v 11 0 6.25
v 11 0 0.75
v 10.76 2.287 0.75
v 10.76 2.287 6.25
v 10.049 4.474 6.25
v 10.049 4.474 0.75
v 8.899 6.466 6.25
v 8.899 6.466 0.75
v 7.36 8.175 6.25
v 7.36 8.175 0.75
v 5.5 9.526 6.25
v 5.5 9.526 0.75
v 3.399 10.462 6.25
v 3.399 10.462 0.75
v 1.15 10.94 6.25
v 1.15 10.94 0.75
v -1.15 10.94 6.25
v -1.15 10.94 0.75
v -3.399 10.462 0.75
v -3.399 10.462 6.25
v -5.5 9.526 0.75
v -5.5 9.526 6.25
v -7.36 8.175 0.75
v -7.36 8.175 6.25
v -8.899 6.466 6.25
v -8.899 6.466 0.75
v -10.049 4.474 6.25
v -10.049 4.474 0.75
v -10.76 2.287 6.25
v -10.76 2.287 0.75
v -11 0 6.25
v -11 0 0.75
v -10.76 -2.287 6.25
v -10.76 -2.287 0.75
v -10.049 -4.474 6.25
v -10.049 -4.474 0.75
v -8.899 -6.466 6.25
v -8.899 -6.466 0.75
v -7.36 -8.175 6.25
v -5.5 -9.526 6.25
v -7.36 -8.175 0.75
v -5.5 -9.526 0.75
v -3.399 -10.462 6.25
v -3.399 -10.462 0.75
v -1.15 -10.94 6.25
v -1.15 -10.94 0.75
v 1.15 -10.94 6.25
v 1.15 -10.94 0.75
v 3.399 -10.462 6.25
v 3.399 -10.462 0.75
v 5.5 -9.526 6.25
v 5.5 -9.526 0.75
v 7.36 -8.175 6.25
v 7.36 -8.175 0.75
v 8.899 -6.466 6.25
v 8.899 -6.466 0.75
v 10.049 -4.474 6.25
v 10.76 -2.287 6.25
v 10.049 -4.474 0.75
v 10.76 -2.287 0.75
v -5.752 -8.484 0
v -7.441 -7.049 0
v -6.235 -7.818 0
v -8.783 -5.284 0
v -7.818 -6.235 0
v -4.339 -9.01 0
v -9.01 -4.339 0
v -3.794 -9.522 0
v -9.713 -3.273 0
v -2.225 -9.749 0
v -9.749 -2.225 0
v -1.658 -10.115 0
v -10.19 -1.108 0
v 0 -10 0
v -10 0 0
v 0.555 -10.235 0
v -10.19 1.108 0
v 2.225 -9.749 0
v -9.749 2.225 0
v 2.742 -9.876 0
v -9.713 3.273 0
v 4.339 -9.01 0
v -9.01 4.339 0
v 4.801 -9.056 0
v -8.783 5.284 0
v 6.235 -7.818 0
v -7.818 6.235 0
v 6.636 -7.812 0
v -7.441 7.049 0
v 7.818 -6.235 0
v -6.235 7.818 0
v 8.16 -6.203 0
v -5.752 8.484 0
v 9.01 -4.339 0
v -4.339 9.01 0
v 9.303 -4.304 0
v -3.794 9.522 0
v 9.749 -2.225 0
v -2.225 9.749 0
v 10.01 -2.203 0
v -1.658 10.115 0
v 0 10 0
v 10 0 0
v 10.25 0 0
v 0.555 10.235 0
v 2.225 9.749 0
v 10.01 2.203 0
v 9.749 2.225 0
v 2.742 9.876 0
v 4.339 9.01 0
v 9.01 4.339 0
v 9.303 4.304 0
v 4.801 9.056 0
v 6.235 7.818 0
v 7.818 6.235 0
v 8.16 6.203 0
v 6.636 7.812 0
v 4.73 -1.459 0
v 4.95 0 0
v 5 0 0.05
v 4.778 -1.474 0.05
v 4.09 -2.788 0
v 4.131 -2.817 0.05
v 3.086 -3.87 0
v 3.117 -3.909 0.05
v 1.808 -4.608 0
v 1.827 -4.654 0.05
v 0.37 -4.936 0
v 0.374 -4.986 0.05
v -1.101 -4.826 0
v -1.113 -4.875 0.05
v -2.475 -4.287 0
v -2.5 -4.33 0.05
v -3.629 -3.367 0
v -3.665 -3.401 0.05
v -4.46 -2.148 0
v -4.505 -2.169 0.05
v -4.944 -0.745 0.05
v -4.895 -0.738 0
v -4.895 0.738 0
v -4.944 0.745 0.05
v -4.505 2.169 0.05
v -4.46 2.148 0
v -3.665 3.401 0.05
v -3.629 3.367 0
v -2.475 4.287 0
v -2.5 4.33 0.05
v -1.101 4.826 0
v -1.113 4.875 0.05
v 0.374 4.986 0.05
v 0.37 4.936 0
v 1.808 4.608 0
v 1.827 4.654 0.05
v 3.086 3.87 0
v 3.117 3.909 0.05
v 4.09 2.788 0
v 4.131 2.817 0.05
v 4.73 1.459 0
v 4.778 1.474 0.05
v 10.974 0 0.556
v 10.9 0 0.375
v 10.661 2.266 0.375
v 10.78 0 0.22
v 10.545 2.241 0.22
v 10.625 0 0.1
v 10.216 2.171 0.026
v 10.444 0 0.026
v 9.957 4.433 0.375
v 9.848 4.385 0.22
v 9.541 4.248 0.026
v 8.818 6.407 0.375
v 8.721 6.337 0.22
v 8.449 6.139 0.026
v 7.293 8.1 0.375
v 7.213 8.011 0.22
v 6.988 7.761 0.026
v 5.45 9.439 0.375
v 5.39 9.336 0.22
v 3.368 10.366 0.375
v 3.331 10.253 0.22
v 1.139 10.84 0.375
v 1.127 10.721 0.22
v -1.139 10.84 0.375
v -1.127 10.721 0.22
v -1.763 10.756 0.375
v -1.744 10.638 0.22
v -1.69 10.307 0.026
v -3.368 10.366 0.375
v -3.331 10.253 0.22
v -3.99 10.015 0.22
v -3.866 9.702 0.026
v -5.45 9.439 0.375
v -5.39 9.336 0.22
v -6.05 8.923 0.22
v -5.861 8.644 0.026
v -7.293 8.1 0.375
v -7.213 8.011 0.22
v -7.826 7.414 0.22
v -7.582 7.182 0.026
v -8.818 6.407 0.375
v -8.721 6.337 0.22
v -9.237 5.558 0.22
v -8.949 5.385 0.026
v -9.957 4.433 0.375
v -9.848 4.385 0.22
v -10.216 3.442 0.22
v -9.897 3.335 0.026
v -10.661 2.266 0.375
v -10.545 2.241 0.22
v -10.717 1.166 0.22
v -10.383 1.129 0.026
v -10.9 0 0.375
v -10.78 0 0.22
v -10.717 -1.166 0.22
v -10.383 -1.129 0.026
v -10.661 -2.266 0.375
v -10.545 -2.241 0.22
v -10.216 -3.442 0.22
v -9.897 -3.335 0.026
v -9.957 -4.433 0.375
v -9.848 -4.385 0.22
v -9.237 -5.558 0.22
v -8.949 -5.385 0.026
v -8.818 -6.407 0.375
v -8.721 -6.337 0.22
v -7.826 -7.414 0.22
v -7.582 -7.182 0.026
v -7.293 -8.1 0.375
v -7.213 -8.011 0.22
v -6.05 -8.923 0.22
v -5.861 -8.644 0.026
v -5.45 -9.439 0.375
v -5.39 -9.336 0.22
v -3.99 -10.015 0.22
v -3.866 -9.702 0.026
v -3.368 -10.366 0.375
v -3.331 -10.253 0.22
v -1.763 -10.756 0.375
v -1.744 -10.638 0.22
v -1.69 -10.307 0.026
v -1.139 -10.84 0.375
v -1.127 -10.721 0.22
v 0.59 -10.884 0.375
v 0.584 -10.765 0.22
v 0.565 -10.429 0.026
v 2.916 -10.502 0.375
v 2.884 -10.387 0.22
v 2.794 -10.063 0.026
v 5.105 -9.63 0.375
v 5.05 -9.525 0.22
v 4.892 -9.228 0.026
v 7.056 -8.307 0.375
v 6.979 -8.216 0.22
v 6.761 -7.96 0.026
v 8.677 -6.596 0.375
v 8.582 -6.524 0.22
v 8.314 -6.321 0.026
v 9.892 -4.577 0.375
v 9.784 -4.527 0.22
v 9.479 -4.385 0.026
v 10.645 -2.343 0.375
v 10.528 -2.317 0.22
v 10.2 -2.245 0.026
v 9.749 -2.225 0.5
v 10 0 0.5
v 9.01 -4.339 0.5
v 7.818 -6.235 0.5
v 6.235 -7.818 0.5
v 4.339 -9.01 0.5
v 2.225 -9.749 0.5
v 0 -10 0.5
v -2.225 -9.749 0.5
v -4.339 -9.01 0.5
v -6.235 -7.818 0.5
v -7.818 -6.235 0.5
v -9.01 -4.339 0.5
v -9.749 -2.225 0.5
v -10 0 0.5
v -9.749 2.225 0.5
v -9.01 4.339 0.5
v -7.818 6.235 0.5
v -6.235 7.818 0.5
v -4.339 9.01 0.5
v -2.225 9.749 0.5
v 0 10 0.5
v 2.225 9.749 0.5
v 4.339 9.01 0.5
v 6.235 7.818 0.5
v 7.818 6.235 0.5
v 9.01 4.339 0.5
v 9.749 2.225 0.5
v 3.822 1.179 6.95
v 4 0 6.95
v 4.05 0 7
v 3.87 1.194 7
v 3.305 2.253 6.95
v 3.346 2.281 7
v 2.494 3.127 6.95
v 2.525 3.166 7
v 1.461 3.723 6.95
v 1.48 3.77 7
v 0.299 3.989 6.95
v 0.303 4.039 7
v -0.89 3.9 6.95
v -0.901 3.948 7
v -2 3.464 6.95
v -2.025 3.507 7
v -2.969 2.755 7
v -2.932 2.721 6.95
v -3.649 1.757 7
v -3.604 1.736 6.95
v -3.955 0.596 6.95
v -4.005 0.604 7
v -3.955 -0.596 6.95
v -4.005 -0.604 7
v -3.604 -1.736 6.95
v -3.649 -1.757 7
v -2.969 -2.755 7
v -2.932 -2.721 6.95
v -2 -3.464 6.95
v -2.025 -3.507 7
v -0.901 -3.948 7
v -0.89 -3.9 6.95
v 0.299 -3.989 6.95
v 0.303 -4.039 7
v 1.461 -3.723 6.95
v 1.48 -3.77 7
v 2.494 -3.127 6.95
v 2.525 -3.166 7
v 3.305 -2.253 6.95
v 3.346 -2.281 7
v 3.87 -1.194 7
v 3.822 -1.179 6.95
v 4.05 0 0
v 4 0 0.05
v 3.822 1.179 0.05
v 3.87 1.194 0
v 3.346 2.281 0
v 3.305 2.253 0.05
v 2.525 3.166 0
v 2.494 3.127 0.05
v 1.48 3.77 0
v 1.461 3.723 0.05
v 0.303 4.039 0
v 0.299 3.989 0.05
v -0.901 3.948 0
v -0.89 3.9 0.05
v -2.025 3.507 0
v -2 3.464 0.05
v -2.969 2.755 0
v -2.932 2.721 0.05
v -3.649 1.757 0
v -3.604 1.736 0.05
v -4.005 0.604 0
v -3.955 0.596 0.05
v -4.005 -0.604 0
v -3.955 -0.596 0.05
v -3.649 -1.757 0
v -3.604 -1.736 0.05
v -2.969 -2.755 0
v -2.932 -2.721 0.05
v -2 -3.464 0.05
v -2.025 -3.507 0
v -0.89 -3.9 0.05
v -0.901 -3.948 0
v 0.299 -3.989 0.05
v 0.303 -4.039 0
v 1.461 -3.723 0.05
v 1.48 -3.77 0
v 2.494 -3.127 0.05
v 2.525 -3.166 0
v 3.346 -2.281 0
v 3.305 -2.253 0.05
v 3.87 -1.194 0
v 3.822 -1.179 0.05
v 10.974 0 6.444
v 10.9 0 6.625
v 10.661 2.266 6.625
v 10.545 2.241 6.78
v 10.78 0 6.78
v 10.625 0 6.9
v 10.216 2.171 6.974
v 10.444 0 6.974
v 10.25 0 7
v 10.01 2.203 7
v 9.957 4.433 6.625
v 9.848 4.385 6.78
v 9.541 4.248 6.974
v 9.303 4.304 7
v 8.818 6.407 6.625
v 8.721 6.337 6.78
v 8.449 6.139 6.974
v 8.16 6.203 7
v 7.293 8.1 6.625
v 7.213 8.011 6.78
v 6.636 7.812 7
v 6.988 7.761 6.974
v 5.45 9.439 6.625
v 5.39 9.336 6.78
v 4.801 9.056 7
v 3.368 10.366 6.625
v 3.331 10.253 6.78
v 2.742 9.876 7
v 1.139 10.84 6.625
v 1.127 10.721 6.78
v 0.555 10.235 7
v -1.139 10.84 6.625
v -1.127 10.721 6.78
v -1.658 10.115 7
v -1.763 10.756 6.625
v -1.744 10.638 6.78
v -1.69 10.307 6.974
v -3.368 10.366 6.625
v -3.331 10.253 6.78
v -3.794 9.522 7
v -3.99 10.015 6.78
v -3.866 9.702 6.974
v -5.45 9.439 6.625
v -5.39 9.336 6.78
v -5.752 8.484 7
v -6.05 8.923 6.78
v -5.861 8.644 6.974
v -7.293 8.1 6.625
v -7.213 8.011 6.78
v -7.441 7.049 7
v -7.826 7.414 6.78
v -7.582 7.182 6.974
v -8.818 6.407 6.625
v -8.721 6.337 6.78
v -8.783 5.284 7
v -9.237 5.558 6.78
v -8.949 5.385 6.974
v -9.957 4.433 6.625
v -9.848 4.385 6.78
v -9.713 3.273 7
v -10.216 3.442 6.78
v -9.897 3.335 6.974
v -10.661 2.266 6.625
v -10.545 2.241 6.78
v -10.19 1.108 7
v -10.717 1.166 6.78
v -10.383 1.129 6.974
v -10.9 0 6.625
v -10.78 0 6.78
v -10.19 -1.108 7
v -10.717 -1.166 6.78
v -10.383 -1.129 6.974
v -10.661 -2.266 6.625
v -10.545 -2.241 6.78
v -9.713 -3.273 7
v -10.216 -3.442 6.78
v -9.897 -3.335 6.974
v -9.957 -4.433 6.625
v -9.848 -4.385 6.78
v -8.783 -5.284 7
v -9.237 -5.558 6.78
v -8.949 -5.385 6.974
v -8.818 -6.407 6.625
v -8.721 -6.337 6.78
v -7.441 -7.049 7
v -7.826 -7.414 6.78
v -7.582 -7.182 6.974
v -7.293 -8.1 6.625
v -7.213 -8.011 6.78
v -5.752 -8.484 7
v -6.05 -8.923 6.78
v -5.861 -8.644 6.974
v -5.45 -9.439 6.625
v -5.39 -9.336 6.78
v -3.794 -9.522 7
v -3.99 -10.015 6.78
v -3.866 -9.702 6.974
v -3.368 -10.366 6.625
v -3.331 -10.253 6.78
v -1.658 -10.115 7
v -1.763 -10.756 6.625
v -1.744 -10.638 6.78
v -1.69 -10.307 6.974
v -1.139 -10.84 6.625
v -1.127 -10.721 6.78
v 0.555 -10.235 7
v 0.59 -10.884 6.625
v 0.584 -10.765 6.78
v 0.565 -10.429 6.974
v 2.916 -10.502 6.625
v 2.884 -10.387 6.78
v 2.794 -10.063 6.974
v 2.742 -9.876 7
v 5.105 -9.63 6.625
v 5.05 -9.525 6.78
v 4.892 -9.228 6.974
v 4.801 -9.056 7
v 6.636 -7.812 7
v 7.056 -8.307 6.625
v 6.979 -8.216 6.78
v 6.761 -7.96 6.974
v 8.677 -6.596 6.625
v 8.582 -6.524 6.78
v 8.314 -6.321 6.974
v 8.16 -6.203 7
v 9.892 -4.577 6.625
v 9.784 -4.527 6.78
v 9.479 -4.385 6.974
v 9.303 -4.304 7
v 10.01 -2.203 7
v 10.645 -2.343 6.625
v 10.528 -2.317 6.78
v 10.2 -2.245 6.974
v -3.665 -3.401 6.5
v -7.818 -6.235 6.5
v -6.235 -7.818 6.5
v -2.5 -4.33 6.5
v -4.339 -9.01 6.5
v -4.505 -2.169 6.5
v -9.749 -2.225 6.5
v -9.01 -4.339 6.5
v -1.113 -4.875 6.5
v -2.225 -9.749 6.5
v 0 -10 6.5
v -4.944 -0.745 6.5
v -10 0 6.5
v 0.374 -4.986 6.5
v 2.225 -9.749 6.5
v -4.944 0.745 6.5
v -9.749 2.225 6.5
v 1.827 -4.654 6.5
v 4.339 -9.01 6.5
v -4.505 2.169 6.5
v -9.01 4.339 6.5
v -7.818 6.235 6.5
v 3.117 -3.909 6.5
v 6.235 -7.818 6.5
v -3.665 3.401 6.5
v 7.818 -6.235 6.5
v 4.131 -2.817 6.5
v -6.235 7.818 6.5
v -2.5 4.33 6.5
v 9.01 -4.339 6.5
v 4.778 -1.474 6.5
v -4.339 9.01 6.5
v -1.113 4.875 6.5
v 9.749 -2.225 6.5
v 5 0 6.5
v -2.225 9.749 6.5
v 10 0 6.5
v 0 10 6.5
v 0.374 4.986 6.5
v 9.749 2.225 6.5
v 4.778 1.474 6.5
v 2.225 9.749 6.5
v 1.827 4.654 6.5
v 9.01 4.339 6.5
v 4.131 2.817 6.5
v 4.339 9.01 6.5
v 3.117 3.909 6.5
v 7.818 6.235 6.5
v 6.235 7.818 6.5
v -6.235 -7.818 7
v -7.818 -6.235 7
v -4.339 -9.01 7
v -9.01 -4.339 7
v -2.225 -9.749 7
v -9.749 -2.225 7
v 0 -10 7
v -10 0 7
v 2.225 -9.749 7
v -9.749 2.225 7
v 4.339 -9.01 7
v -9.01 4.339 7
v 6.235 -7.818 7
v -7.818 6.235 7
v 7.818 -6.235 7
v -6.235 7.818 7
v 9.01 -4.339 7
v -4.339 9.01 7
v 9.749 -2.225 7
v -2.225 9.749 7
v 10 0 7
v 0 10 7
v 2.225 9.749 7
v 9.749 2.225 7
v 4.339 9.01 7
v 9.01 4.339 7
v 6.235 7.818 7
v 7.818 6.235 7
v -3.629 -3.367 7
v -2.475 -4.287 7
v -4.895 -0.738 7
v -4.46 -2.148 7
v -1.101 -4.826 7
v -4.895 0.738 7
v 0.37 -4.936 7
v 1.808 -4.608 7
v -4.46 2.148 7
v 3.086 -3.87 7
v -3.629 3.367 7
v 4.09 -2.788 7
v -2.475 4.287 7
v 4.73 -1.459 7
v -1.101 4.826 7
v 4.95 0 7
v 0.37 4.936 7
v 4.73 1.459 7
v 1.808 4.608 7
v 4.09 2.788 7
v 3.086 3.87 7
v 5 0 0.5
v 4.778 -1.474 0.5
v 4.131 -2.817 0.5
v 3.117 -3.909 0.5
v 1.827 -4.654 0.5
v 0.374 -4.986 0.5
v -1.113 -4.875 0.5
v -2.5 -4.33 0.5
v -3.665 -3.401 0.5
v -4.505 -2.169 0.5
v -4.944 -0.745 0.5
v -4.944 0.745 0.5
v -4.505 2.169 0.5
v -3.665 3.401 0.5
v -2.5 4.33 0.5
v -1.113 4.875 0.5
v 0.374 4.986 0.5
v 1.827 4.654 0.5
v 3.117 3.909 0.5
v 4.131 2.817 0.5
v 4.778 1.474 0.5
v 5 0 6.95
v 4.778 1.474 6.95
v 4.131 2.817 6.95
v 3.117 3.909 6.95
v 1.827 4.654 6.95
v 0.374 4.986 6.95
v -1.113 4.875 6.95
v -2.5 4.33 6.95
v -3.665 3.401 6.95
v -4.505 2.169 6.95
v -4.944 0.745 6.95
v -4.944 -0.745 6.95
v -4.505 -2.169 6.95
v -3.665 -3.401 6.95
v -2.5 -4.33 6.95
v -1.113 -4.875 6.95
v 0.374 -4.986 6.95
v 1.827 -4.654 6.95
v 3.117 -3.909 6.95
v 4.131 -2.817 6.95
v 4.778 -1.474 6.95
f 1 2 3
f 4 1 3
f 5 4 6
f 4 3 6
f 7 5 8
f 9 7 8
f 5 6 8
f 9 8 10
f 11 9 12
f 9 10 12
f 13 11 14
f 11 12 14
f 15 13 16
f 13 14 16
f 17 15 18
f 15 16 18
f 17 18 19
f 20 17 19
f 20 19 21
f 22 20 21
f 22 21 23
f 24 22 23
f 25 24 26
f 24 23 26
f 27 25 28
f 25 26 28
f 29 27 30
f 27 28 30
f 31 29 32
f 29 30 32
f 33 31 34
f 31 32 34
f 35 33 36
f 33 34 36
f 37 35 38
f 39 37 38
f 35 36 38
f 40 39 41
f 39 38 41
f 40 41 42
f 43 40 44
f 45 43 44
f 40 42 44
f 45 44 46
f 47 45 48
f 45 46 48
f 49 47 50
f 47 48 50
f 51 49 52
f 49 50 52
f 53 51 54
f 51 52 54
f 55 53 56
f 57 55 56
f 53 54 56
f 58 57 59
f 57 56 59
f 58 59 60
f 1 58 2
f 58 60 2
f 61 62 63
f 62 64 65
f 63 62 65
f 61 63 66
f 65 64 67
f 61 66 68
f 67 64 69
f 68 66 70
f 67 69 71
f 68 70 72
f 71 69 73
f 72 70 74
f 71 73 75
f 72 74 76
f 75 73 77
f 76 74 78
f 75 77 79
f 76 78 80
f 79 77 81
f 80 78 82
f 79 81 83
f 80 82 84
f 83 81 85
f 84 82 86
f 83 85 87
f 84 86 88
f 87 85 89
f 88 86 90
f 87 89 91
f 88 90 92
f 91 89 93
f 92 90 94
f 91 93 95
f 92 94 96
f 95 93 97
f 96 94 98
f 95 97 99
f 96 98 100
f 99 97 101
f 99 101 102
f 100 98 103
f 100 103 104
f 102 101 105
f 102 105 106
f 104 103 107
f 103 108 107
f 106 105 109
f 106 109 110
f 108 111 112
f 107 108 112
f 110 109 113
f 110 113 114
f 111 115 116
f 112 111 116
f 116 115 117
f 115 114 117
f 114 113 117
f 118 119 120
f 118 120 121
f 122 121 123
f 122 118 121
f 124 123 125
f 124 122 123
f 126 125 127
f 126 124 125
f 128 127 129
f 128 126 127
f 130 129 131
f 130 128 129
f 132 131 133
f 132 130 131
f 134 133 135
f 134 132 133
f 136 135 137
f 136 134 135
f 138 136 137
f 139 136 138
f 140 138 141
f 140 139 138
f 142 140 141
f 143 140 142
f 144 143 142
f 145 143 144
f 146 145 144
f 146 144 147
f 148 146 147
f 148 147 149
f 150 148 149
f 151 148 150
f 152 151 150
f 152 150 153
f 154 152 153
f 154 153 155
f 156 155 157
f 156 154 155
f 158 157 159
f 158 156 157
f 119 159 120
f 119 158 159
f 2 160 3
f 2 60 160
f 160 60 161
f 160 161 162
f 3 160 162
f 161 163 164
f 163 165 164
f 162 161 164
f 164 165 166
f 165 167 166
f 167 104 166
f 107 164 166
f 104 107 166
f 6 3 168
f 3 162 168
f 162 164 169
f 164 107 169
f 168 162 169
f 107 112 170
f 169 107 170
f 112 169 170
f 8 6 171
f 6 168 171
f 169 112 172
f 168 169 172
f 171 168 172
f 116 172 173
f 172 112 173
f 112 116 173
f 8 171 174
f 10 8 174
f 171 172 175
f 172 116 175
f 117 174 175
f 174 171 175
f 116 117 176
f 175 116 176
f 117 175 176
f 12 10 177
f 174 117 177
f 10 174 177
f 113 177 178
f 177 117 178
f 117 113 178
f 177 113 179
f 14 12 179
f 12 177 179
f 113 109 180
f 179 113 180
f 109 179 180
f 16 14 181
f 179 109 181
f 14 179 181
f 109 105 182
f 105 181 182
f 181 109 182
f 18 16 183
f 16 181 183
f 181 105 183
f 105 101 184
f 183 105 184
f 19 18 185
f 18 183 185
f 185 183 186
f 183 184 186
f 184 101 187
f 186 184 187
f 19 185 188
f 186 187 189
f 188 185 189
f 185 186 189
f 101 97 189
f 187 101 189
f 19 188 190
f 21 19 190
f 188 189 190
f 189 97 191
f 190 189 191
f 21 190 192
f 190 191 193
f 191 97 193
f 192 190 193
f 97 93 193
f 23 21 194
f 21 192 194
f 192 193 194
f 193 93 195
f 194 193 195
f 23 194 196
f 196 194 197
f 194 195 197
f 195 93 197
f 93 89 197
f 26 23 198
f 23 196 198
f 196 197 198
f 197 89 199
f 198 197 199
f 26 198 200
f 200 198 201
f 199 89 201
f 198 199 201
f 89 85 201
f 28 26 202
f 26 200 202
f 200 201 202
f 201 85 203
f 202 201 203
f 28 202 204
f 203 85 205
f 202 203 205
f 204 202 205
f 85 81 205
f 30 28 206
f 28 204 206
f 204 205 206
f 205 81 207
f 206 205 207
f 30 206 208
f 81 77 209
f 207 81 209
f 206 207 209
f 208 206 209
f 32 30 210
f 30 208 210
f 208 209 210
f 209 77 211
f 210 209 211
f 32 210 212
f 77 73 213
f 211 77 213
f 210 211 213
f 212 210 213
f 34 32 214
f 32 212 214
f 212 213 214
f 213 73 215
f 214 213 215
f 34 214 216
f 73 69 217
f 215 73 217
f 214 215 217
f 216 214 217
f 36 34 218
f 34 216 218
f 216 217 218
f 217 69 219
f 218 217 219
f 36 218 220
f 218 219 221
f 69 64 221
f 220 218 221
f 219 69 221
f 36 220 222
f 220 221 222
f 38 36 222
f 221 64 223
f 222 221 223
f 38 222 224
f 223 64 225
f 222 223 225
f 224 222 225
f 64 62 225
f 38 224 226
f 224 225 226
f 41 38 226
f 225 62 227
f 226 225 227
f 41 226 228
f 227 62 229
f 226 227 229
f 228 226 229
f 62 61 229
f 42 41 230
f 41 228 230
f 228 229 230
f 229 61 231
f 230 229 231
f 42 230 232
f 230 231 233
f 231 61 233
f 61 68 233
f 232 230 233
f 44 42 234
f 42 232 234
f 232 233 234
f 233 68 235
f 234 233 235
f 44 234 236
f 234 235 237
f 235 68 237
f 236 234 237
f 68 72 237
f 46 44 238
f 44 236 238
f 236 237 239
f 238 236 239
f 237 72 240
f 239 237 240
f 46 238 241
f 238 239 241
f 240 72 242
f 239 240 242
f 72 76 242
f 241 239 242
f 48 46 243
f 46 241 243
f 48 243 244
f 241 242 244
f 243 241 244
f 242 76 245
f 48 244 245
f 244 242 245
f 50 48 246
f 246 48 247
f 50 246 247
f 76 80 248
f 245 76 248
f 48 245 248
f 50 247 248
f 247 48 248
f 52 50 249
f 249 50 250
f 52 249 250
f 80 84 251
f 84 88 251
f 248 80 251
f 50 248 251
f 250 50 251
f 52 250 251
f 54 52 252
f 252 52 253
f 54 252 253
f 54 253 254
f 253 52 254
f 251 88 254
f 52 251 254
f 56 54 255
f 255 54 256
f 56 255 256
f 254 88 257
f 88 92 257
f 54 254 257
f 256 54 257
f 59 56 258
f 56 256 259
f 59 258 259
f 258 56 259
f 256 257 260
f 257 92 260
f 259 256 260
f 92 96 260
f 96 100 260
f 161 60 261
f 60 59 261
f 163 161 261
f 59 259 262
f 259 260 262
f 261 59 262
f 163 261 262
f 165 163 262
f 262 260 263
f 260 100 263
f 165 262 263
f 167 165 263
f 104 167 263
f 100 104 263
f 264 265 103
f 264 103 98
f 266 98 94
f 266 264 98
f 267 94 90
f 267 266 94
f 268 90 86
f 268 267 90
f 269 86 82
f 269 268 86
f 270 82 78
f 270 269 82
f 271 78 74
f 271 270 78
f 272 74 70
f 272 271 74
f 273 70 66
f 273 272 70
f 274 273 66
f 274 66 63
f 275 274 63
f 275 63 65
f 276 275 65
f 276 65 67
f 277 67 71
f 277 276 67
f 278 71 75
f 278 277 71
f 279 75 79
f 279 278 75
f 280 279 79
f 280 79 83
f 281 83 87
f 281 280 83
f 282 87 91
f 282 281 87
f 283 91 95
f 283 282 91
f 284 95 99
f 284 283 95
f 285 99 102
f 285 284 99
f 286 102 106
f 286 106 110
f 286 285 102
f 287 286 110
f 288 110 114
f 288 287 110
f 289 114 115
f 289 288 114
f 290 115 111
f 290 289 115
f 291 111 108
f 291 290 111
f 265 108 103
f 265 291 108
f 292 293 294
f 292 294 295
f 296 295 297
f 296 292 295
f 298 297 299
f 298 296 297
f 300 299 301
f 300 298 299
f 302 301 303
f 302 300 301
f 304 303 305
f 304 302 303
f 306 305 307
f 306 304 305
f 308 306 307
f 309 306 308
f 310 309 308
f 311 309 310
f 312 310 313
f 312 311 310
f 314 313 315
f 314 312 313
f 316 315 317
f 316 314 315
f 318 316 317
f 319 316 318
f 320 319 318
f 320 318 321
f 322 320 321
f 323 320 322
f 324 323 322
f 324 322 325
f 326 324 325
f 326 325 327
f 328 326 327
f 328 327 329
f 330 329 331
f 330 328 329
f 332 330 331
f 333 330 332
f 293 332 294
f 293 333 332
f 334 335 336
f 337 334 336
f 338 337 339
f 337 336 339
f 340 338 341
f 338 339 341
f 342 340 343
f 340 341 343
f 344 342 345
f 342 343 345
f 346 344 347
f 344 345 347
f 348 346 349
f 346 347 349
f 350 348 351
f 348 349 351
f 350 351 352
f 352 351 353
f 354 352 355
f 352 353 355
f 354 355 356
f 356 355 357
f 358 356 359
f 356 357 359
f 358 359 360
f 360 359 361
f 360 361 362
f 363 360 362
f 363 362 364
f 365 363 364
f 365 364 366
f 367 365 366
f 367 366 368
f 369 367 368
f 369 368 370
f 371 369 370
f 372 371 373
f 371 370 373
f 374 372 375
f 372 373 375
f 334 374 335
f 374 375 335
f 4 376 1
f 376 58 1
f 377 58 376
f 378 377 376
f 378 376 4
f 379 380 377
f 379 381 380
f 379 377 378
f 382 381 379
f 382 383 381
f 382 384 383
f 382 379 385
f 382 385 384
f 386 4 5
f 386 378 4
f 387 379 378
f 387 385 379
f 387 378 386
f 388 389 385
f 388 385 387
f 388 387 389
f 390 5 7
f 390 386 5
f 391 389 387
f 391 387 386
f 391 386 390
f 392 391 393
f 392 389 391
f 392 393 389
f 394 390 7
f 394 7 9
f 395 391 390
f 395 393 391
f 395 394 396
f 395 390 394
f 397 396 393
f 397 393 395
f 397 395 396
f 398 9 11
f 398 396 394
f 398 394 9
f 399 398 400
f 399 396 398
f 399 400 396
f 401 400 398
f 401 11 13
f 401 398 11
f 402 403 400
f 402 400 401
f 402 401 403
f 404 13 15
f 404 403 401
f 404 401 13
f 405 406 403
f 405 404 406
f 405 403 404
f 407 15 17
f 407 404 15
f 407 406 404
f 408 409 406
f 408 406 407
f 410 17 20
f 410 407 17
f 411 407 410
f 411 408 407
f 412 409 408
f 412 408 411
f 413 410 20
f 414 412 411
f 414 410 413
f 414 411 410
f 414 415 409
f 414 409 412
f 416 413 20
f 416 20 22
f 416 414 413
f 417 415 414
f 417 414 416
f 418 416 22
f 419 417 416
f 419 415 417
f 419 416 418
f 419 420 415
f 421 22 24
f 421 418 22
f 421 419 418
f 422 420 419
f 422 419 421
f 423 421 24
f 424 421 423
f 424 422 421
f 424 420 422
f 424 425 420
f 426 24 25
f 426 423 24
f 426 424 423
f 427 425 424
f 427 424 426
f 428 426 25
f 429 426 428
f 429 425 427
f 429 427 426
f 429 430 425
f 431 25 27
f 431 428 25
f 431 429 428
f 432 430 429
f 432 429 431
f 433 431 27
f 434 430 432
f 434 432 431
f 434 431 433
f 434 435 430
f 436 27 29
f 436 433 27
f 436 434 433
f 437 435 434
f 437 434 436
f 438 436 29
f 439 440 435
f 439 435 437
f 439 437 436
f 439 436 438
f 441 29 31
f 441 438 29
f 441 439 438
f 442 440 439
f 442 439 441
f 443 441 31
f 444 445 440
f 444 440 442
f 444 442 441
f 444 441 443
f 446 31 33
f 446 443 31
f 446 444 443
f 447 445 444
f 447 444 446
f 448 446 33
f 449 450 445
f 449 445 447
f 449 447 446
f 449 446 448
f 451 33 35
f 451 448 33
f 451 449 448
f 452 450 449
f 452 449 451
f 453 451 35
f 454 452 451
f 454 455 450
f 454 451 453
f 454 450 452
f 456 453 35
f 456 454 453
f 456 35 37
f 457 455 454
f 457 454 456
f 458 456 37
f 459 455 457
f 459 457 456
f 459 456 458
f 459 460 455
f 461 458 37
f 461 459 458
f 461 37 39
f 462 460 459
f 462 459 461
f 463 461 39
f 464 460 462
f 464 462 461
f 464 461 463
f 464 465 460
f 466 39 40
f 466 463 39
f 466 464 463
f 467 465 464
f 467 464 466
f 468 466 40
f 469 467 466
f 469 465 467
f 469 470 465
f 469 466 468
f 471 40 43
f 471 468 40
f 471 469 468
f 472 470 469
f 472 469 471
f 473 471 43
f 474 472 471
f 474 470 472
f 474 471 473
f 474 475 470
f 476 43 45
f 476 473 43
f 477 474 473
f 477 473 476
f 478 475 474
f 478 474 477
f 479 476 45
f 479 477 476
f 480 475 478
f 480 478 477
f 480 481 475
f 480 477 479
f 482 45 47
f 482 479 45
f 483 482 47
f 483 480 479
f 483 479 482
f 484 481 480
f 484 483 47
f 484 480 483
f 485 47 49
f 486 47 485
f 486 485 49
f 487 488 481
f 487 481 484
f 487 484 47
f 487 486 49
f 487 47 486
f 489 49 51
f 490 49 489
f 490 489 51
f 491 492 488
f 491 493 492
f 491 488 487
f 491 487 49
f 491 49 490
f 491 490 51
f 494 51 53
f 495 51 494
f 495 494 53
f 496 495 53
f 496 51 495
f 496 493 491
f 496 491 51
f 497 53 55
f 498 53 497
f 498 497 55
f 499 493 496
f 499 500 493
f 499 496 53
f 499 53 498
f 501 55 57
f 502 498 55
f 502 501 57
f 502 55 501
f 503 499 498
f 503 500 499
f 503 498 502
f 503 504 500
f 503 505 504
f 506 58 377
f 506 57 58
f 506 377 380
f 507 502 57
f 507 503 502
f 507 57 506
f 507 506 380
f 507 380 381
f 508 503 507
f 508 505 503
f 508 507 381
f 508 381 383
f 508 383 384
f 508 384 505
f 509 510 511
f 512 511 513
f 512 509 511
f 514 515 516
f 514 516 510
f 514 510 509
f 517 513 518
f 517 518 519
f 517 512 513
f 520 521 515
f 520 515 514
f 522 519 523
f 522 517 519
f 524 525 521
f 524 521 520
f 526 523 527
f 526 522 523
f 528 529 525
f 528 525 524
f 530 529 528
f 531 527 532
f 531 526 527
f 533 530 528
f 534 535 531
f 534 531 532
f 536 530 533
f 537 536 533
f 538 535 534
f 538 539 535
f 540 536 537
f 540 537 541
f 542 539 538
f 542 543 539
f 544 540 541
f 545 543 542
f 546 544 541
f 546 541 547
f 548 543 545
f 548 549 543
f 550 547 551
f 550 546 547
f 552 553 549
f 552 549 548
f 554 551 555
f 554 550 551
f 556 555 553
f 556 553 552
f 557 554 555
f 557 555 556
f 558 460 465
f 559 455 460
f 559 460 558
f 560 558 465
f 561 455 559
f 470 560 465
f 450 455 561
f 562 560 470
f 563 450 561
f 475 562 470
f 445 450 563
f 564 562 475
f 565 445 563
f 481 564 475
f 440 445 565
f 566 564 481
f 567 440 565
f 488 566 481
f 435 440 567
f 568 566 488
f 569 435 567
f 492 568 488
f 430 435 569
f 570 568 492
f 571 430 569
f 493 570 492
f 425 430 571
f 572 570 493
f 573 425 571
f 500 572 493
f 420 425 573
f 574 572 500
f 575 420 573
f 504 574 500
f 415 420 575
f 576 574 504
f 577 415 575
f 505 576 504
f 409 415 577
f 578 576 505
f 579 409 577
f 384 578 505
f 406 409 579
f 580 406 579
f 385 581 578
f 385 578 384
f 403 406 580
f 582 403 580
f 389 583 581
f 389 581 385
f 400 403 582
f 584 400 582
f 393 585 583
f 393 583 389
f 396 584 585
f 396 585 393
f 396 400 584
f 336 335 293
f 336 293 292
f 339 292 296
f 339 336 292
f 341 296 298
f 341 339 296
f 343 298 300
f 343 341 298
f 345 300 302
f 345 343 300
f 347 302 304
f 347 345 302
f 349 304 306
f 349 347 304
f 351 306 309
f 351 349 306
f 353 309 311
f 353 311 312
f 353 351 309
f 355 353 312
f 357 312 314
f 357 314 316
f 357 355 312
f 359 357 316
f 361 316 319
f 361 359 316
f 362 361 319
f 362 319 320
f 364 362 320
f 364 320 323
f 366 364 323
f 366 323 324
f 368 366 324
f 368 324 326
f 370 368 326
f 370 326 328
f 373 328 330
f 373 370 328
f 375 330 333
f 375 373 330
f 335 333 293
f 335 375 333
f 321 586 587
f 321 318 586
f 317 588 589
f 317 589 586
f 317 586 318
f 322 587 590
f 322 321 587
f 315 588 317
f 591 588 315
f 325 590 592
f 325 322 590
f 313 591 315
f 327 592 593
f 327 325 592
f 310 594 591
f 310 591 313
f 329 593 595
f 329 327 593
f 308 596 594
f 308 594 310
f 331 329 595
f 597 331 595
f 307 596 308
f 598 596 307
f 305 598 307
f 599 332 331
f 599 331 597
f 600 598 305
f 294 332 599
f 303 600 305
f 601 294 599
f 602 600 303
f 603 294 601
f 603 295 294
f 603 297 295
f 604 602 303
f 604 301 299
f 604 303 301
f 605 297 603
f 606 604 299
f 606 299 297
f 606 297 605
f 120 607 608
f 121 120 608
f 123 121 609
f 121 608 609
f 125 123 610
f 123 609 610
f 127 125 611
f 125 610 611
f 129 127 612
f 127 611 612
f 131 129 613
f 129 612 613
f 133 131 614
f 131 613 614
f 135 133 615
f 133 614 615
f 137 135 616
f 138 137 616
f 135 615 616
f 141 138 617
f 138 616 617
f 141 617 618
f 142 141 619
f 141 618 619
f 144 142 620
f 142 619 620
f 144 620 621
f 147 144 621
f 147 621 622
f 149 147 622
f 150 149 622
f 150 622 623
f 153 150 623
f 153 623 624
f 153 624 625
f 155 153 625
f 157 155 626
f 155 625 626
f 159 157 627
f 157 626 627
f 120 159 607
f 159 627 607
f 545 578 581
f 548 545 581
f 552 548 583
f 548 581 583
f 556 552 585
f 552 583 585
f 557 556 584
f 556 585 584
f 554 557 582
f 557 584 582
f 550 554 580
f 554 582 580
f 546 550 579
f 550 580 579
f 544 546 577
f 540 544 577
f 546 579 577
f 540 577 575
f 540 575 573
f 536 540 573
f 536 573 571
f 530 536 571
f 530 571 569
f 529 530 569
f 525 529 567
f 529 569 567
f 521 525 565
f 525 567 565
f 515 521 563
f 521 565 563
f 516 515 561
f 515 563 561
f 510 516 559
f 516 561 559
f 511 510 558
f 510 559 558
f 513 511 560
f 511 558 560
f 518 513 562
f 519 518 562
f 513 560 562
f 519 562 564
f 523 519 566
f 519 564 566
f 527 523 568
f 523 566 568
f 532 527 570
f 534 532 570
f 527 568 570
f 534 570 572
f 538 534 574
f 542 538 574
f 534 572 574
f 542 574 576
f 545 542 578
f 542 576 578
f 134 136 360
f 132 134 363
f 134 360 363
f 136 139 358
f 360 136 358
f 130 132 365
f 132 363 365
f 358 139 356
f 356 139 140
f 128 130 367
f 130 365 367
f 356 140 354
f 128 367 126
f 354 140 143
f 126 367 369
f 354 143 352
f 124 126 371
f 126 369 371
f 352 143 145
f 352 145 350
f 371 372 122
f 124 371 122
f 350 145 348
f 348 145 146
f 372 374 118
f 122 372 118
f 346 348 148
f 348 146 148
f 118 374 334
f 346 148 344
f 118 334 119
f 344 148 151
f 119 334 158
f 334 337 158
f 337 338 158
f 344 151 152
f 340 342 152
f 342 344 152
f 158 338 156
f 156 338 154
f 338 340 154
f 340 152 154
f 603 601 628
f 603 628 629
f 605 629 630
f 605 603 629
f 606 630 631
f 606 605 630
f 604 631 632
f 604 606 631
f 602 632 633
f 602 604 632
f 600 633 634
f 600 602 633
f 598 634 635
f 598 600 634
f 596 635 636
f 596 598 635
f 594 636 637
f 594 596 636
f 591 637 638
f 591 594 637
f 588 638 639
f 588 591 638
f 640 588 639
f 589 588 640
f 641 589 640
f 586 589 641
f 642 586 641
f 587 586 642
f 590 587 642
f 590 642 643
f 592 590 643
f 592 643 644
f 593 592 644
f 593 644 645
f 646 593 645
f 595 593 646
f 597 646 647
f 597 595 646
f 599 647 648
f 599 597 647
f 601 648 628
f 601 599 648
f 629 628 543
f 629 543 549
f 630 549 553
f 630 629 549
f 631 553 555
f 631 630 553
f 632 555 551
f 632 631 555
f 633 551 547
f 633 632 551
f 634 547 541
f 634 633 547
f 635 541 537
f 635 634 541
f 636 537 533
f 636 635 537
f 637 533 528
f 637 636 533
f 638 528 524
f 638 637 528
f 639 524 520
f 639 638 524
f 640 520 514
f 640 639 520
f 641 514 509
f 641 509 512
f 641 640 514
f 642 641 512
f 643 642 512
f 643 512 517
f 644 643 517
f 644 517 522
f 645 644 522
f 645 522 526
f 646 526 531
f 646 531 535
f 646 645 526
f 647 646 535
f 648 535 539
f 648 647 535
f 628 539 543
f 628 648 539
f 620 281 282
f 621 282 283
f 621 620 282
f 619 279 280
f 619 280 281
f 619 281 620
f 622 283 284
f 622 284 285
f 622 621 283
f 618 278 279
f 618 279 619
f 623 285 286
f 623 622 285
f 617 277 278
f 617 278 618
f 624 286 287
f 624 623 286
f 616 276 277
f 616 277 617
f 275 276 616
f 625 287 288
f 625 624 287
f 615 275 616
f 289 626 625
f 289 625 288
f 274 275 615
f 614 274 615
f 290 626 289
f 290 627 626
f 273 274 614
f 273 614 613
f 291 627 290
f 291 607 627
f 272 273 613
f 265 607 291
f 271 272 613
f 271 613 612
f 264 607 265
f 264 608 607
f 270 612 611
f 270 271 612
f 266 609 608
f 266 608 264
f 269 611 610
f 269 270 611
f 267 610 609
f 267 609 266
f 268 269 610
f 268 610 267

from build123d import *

# Parameters (mm, degrees)
ESQUISSE1_R             = 11
ESQUISSE1_R_2           = 4
BOSS_EXTRU_1_DEPTH      = 7
ESQUISSE2_R             = 10
ESQUISSE2_R_2           = 5
ENL_V_MAT_EXTRU_1_DEPTH = 0.5
ENL_V_START             = -0.5
ESQUISSE3_R             = 10
ESQUISSE3_R_2           = 5
ENL_V_MAT_EXTRU_2_DEPTH = 0.5
CONG_1_R                = 0.75
CHANFREIN1_SIZE         = 0.05


with BuildPart() as part:
    # Esquisse1 → Boss.-Extru.1 (new body)
    with BuildSketch(Plane.XY):
        Circle(ESQUISSE1_R)
        Circle(ESQUISSE1_R_2, mode=Mode.SUBTRACT)
    extrude(amount=BOSS_EXTRU_1_DEPTH)

    # Esquisse2 → Enlèv. mat.-Extru.1 (cut)
    with BuildSketch(Plane.XY.offset(7)):
        Circle(ESQUISSE2_R)
        Circle(ESQUISSE2_R_2, mode=Mode.SUBTRACT)
    extrude(amount=-ENL_V_MAT_EXTRU_1_DEPTH, mode=Mode.SUBTRACT)

    # Esquisse3 → Enlèv. mat.-Extru.2 (cut)
    with BuildSketch(Plane(origin=(0, 0, 0), x_dir=(-1, 0, 0), z_dir=(0, 0, -1)).offset(ENL_V_START)):
        with Locations(Location((0, 0, 0), (0, 0, 180))):
            Circle(ESQUISSE3_R)
        with Locations(Location((0, 0, 0), (0, 0, 180))):
            Circle(ESQUISSE3_R_2, mode=Mode.SUBTRACT)
    extrude(amount=ENL_V_MAT_EXTRU_2_DEPTH, mode=Mode.SUBTRACT)

    # Congé1
    cong_1_edges = [part.edges().sort_by_distance(p)[0] for p in [
        (-11, 0, 0),
        (-11, 0, 7),
    ]]
    fillet(cong_1_edges, radius=CONG_1_R)

    # Chanfrein1
    chanfrein1_edges = [part.edges().sort_by_distance(p)[0] for p in [
        (-5, 0, 7),
        (-5, 0, 0),
        (-4, 0, 0),
        (-4, 0, 7),
    ]]
    chamfer(chanfrein1_edges, length=CHANFREIN1_SIZE)


solid = part.part
